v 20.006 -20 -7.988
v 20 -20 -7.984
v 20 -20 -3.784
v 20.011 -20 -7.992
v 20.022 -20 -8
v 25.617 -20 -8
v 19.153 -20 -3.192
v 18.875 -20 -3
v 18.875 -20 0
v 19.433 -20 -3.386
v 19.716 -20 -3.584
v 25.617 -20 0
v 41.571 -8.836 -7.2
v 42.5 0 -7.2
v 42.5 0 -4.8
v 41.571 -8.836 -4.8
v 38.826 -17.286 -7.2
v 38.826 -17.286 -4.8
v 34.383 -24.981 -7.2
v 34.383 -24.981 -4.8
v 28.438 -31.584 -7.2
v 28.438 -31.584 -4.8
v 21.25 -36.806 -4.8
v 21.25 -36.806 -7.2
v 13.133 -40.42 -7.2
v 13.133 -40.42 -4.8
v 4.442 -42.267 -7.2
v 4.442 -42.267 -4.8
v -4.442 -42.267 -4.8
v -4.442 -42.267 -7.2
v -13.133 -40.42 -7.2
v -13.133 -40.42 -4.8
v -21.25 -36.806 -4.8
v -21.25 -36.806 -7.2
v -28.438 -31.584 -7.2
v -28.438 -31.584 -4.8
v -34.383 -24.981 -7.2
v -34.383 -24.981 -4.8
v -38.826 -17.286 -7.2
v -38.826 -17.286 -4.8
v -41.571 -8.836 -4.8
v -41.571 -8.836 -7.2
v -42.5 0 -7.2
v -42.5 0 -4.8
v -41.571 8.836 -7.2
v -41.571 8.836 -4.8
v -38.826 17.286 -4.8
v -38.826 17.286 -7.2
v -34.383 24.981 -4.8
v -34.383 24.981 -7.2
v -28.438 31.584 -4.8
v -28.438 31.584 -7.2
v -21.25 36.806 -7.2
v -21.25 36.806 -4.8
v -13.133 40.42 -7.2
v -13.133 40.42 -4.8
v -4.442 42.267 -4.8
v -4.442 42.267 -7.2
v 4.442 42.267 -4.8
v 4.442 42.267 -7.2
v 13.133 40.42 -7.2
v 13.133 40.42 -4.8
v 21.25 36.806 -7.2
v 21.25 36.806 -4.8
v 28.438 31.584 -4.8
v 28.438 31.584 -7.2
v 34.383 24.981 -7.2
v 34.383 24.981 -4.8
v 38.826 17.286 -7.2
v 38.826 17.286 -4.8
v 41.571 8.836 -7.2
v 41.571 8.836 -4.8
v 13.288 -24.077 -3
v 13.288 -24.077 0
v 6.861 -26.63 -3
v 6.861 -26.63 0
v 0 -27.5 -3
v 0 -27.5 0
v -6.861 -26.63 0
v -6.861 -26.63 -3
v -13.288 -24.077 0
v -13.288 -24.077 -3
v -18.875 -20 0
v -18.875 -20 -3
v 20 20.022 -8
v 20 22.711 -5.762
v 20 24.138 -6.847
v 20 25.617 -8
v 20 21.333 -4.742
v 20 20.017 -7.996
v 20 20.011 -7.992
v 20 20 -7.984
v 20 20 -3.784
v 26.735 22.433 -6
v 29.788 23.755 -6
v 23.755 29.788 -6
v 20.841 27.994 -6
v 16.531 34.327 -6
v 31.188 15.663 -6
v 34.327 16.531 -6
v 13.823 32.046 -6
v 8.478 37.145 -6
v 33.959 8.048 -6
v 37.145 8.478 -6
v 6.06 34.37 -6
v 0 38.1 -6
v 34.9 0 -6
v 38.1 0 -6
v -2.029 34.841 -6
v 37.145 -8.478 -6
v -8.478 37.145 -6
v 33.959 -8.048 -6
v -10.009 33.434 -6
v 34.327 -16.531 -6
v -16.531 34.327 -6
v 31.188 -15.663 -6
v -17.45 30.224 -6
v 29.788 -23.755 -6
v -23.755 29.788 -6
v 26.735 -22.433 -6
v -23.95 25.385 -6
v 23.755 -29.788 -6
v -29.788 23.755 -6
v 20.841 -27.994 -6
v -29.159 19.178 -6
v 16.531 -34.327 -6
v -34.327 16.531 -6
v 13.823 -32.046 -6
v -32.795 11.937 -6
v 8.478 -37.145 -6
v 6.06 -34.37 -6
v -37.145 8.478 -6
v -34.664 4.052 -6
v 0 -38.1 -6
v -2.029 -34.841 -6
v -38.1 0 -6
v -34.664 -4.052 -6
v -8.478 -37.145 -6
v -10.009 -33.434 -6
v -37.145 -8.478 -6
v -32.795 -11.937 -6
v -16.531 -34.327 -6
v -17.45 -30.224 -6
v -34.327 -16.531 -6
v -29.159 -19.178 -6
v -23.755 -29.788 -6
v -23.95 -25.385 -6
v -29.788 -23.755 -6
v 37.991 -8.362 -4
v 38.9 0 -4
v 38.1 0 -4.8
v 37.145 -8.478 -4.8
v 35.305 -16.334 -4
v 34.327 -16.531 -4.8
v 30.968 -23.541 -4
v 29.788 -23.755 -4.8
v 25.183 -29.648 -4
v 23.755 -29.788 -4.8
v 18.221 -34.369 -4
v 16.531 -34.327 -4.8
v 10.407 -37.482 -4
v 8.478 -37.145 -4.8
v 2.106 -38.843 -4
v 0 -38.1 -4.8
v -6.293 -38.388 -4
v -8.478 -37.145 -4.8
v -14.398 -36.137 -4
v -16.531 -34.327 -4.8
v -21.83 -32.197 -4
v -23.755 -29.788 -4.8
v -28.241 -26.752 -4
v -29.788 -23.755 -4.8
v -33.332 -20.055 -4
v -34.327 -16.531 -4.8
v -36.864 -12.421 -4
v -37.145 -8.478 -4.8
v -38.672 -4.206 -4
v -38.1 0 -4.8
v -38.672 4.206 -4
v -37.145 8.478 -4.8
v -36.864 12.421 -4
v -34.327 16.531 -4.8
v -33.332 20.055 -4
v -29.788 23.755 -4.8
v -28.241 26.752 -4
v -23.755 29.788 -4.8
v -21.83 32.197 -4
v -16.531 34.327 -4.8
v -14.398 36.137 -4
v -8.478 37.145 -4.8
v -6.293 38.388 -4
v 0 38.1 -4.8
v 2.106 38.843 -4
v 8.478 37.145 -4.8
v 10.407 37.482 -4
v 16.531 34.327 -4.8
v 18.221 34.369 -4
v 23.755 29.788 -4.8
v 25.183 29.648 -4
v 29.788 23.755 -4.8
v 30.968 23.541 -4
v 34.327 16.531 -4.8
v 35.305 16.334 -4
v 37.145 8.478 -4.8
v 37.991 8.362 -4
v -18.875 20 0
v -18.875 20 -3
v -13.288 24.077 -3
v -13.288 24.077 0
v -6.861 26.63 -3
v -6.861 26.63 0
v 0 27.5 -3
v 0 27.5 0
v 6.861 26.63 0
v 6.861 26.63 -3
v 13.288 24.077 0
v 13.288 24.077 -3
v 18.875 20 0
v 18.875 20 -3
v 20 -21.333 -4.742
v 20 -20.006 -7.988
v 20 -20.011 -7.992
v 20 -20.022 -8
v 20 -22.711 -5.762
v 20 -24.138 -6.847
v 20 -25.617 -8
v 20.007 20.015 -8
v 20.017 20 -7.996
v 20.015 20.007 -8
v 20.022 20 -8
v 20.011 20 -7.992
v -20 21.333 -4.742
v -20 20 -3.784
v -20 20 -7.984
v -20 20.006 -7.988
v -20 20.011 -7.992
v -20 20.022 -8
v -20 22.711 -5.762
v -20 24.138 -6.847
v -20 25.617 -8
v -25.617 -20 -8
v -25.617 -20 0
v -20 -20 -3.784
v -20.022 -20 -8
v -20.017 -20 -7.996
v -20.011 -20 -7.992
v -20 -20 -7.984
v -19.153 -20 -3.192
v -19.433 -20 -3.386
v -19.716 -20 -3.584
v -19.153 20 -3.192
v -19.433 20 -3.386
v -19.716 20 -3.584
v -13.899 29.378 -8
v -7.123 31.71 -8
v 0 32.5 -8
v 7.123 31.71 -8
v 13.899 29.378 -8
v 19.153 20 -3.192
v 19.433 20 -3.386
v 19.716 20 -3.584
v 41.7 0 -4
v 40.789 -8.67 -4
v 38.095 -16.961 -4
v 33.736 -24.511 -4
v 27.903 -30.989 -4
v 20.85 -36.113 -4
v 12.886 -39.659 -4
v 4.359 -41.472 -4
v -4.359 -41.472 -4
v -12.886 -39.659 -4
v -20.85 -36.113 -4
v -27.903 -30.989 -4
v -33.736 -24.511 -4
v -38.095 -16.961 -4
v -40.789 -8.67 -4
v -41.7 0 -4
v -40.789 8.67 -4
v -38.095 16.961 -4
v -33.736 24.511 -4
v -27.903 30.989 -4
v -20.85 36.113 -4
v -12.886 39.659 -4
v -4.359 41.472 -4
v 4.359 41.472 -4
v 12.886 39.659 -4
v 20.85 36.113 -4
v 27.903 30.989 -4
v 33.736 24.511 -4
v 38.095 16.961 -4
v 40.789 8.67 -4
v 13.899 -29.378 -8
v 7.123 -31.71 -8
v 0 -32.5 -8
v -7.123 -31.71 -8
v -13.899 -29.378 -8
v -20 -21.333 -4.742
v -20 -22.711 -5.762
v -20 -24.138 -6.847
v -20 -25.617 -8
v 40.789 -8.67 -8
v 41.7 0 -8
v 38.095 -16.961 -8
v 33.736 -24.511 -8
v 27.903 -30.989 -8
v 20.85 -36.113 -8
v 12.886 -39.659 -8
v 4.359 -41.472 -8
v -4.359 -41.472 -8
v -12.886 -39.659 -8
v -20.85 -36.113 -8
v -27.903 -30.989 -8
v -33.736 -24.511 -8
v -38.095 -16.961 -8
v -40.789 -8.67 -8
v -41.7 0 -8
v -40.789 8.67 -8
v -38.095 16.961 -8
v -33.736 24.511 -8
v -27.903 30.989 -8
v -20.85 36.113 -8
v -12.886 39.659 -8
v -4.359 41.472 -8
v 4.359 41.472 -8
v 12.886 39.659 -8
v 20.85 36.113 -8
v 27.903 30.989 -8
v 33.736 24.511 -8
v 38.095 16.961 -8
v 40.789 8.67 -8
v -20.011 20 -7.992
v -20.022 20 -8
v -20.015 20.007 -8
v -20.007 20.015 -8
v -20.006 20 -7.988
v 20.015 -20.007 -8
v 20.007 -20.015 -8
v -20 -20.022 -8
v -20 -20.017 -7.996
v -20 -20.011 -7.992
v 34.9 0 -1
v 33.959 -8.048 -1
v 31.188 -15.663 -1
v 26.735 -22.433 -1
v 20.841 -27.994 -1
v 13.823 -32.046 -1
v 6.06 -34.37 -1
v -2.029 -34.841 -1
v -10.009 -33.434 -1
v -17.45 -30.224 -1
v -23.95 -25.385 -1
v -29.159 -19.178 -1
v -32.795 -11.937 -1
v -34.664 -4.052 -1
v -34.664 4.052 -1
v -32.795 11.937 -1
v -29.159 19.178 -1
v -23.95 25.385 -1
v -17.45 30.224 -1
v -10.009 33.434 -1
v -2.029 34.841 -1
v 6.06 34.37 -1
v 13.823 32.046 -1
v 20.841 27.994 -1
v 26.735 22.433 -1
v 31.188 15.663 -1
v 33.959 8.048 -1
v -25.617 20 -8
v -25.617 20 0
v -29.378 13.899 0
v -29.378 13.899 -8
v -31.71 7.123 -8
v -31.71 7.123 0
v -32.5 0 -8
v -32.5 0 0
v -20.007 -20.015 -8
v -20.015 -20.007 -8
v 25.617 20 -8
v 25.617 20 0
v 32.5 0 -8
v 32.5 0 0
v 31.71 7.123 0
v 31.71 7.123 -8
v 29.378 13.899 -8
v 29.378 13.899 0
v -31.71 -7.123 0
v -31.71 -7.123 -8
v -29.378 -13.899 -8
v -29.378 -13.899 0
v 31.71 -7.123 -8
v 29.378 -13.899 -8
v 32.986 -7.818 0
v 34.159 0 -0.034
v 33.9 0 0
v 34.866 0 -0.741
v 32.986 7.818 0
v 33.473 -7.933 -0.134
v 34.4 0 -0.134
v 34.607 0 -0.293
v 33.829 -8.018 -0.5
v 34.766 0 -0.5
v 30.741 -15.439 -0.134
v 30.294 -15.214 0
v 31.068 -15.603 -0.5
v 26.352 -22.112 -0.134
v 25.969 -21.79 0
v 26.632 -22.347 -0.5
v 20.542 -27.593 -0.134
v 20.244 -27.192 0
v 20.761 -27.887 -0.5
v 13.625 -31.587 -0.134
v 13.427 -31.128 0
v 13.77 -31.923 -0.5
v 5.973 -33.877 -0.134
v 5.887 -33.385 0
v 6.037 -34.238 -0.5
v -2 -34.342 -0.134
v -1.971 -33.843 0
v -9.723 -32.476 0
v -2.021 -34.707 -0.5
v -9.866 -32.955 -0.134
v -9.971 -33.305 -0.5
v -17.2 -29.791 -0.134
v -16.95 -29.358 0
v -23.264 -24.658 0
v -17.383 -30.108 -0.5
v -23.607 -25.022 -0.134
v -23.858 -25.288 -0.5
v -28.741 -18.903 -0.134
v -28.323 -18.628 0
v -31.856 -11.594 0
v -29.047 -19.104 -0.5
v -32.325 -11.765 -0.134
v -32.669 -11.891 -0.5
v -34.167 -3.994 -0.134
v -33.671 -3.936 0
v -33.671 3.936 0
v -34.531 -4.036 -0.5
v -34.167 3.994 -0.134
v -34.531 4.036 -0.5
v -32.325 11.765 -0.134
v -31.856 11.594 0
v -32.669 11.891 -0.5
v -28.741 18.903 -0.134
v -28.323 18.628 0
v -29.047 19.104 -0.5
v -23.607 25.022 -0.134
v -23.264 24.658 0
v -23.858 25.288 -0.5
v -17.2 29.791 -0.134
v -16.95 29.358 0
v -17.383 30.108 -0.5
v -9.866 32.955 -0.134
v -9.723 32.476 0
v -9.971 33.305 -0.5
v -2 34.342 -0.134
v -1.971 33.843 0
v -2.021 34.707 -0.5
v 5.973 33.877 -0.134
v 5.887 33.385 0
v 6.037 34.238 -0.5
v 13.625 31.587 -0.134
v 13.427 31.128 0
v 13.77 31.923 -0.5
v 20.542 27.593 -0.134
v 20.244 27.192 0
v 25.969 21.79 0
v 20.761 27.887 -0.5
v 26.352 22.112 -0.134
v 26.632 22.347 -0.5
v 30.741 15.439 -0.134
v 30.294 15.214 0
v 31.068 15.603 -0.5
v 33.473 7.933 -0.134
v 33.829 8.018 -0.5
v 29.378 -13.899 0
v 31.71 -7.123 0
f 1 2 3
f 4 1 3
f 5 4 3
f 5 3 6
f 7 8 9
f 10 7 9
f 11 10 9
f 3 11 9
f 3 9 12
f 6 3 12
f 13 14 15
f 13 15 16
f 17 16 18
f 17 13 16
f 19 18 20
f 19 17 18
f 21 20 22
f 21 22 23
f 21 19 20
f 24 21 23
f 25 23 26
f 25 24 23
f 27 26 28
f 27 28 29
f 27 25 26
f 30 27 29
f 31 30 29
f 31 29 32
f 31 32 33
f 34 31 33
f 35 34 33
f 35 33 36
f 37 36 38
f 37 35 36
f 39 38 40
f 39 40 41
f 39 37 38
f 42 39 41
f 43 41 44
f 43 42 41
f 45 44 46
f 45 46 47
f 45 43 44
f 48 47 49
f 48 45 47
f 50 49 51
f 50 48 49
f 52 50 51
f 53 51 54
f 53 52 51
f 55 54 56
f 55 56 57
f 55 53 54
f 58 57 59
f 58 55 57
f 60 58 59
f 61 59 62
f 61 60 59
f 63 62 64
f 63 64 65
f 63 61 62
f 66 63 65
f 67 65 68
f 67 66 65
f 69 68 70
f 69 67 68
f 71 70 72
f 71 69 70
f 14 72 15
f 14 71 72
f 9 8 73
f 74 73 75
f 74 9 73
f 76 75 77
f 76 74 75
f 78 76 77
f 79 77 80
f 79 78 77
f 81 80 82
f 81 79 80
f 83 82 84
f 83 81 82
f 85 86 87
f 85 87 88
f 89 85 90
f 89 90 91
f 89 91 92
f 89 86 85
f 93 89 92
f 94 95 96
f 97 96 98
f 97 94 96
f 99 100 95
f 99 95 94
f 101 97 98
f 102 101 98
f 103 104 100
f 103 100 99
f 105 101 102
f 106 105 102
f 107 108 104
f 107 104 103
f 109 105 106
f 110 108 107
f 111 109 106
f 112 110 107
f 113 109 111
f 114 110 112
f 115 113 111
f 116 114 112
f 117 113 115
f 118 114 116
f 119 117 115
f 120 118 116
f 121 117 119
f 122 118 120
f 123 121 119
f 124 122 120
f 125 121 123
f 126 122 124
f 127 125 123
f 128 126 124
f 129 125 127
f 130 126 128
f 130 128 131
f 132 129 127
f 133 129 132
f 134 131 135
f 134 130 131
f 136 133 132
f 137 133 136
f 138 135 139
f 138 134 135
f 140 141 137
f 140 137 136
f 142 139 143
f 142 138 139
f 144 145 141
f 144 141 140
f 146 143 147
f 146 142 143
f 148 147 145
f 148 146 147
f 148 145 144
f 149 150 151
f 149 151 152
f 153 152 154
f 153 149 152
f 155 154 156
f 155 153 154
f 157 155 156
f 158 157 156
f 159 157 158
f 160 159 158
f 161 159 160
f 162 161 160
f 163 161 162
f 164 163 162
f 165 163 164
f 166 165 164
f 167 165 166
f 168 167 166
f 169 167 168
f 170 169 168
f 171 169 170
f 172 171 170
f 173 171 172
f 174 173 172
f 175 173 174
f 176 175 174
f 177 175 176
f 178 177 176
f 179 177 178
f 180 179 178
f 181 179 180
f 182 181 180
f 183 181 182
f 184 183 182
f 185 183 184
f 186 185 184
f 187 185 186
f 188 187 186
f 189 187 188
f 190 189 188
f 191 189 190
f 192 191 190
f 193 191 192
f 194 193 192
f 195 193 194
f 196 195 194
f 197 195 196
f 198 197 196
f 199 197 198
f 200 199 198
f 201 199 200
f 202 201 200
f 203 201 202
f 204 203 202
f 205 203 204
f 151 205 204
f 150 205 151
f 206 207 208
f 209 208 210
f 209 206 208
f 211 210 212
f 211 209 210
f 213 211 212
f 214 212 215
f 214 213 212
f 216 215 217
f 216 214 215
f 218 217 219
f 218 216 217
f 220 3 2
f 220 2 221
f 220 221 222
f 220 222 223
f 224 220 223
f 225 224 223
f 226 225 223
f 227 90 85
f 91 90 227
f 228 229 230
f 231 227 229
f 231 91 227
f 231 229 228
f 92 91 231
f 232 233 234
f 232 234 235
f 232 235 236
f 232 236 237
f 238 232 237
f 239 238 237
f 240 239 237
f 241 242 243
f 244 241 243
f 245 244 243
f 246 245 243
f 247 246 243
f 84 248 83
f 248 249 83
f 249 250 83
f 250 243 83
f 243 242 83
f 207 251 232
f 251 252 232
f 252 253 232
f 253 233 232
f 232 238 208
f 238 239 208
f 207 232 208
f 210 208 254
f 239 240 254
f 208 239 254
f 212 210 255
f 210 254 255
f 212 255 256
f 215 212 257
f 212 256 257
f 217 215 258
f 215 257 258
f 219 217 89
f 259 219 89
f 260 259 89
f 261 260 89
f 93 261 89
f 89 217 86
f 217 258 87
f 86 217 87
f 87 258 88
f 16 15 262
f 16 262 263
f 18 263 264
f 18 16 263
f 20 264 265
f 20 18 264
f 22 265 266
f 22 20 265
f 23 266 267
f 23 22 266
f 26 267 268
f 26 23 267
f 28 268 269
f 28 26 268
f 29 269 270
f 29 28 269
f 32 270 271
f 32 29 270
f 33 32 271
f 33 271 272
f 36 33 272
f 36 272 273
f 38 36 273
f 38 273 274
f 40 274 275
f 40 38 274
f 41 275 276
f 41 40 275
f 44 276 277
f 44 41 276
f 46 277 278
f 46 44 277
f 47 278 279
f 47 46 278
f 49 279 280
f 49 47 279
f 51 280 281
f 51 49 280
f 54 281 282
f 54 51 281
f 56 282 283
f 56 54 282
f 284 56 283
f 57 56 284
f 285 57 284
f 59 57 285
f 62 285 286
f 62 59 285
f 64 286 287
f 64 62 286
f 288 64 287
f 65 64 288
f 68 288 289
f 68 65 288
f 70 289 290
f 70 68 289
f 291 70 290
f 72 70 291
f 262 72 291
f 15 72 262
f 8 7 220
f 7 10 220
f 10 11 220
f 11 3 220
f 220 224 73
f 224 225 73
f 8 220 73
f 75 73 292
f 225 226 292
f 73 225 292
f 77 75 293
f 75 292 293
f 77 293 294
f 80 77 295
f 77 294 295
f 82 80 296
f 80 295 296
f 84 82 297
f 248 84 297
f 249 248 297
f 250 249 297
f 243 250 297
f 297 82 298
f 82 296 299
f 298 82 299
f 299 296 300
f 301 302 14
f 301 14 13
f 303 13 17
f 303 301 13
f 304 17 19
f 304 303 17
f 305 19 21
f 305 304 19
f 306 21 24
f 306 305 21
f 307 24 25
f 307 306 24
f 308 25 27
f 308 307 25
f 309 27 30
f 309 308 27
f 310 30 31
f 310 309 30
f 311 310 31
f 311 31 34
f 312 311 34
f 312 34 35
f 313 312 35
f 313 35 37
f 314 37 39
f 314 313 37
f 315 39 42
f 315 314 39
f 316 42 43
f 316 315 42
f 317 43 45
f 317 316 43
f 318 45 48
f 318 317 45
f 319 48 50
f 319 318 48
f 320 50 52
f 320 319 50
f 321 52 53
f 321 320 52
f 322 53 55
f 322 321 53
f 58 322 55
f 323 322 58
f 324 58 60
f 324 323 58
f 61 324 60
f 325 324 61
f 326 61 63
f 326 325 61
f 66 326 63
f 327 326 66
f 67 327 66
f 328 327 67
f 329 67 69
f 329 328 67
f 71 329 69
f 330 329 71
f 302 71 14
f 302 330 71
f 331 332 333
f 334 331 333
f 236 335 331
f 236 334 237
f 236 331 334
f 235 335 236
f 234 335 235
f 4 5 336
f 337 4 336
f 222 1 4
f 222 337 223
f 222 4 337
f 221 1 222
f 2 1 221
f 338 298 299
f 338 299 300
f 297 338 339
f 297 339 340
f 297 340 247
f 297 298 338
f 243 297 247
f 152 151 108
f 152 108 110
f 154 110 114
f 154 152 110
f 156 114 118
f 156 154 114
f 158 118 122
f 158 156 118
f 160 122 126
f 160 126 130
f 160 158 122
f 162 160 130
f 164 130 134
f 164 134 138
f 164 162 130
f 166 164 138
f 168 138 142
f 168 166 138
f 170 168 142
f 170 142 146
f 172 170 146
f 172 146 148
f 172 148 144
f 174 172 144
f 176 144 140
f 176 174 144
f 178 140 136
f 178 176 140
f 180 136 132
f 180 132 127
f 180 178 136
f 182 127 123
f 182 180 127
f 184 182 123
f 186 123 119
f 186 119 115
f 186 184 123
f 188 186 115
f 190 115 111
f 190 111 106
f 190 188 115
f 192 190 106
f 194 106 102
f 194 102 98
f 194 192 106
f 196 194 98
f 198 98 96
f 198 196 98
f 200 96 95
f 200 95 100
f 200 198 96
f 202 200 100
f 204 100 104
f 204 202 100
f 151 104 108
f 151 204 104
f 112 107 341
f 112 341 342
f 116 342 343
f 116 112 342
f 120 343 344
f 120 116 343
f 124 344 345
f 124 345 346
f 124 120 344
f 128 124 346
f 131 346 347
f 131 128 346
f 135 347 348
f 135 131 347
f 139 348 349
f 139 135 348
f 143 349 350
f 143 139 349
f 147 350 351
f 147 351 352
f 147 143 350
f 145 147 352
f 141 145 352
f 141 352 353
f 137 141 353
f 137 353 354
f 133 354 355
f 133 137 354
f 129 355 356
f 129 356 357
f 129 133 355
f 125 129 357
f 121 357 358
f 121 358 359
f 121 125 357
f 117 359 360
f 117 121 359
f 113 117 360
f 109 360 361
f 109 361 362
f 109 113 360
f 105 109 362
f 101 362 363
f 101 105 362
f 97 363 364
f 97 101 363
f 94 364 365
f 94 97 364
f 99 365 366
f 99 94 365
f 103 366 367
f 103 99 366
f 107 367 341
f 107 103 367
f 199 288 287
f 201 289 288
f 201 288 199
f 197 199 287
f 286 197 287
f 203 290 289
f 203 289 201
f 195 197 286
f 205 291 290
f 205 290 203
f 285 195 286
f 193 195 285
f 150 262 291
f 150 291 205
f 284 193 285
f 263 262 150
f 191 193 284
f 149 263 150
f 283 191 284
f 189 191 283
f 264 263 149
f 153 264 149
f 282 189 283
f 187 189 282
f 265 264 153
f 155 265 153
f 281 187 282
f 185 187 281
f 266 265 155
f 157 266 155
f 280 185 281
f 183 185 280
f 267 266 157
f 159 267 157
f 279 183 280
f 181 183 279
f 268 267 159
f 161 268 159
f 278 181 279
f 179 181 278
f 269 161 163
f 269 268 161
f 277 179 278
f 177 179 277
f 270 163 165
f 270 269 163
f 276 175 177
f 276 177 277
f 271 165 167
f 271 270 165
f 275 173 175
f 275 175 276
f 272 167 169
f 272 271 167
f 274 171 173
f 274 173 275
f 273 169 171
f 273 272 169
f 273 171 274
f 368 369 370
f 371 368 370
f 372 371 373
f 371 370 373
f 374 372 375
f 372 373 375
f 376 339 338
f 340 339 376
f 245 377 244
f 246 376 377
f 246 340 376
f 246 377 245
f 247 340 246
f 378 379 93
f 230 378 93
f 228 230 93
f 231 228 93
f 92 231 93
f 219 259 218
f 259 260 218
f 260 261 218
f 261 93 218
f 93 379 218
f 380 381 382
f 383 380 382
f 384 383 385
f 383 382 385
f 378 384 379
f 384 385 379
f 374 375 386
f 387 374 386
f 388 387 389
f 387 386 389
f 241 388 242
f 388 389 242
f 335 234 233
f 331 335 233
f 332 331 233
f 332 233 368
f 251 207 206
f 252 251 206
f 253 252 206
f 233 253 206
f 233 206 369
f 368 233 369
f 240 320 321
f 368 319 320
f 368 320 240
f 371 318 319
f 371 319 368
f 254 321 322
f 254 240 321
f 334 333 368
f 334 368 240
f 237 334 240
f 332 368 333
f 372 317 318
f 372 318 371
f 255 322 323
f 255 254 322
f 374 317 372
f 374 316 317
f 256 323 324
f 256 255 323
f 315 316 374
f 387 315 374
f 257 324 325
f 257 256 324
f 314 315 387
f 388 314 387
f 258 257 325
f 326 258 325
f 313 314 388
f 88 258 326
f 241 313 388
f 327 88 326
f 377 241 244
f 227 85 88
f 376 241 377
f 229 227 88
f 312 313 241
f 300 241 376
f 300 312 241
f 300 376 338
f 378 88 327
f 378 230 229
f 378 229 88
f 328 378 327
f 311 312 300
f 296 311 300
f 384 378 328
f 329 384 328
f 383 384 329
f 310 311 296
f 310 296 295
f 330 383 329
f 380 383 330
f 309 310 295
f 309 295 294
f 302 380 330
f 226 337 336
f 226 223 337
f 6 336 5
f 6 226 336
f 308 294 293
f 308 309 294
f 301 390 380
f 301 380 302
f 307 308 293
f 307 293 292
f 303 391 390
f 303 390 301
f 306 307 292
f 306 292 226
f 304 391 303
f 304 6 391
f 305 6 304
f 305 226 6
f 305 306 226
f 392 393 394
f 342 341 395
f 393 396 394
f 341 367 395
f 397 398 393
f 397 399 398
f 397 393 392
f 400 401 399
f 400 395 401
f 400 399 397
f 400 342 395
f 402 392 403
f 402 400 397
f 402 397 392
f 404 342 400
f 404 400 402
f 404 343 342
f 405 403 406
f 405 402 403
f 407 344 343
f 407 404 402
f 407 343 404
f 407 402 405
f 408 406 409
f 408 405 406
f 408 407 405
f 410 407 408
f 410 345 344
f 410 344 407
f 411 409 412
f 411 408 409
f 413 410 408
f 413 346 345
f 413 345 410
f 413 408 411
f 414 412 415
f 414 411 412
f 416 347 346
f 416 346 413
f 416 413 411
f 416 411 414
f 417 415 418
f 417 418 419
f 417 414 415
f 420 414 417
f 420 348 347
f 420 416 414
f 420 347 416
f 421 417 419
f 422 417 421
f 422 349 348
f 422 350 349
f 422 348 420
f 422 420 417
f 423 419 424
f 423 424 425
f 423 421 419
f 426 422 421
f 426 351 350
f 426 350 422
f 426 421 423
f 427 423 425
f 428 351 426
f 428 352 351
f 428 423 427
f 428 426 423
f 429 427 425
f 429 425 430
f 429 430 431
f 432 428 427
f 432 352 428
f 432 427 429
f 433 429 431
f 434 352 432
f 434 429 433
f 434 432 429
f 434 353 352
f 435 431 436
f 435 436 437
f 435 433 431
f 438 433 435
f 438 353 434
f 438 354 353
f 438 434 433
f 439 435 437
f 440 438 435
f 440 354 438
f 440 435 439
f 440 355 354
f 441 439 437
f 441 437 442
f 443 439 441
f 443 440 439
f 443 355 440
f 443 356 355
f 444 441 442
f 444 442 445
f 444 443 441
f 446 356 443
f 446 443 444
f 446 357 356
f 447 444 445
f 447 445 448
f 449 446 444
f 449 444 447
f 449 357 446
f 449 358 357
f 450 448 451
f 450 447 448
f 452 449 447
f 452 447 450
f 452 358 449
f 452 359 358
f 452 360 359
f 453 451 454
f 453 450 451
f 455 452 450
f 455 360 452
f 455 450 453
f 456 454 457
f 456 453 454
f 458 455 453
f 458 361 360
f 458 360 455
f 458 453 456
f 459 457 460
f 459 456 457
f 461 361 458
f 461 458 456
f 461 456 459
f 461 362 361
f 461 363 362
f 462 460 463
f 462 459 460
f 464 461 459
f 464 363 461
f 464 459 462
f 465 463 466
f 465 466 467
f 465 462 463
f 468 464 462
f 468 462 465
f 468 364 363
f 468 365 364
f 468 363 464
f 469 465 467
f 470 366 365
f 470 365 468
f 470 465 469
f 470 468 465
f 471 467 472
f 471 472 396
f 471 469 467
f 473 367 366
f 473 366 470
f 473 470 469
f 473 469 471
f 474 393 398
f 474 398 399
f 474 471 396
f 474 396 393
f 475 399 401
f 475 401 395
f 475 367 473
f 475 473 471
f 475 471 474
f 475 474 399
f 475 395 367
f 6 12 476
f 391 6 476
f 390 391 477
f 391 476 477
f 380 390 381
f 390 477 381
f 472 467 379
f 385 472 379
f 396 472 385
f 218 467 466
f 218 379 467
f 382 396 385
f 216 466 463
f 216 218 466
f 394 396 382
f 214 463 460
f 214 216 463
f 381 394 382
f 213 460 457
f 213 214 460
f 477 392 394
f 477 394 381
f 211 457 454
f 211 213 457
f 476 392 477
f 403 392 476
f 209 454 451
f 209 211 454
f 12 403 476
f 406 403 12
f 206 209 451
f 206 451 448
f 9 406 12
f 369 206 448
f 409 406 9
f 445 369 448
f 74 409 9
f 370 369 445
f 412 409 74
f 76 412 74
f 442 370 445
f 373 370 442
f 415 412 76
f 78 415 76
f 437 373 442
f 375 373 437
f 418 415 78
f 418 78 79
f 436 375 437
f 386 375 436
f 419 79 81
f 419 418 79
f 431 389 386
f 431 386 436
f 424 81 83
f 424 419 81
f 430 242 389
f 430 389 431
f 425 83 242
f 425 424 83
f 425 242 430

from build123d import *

# Parameters (mm, degrees)
FASE1_SIZE                      = 0.8
SCHNITT_LINEAR_AUSTRAGEN1_DEPTH = 10
SCHNITT_LINEAR_START            = -5
SCHNITT_LINEAR_AUSTRAGEN2_DEPTH = 5
FASE2_SIZE                      = 5
VERRUNDUNG1_R                   = 1


# Read off the part's stored shape, not the designer's step: Schnitt-Linear austragen2
with BuildPart() as part:
    # Skizze3 → Rotation1 (revolve)
    with BuildSketch(Plane(origin=(0, 0, 0), x_dir=(0, 0, -1), z_dir=(1, 0, 0)), mode=Mode.PRIVATE) as rotation1_sk:
        Polygon((0, 27.5), (0, 34.9), (6, 34.9), (6, 38.1), (4, 38.1), (4, 42.5), (8, 42.5), (8, 27.5), align=None)
    revolve(rotation1_sk.sketch.rotate(Axis((0, 0, 28.082191781), (0, 0, -1)), 90), axis=Axis((0, 0, 28.082191781), (0, 0, -1)))

    # Fase1
    fase1_edges = [part.edges().sort_by_distance(p)[0] for p in [
        (-27.5, 0, -8),
        (-42.5, 0, -8),
        (-42.5, 0, -4),
        (-38.1, 0, -4),
    ]]
    chamfer(fase1_edges, length=FASE1_SIZE)

    # Skizze4 → Schnitt-Linear austragen1 (cut)
    with BuildSketch(Plane.XY):
        with BuildLine():
            Line((25.617376915, 20), (-25.617376915, 20))
            ThreePointArc((-25.617376915, 20), (-30.731211738, 10.575567367), (-32.5, 0))
            Line((-32.5, 0), (32.5, 0))
            ThreePointArc((32.5, 0), (30.731211738, 10.575567367), (25.617376915, 20))
        make_face()
        with BuildLine():
            Line((32.5, 0), (-32.5, 0))
            ThreePointArc((-32.5, 0), (-30.731211738, -10.575567367), (-25.617376915, -20))
            Line((-25.617376915, -20), (25.617376915, -20))
            ThreePointArc((25.617376915, -20), (30.731211738, -10.575567367), (32.5, 0))
        make_face()
    extrude(amount=-SCHNITT_LINEAR_AUSTRAGEN1_DEPTH, mode=Mode.SUBTRACT)

    # Schnitt-Linear austragen2 outline → Schnitt-Linear austragen2 (cut)
    with BuildSketch(Plane(origin=(0, 0, -8), x_dir=(-1, 0, 0), z_dir=(0, 0, -1)).offset(SCHNITT_LINEAR_START)):
        with BuildLine():
            Line((-20, -20), (-20, -25.617376915))
            ThreePointArc((-20, -25.617376915), (0, -32.5), (20, -25.617376915))
            Line((20, -25.617376915), (20, -20))
            Line((20, -20), (18.874586088, -20))
            ThreePointArc((18.874586088, -20), (0, -27.5), (-18.874586088, -20))
            Line((-18.874586088, -20), (-20, -20))
        make_face()
        with BuildLine():
            Line((20, 20), (20, 25.617376915))
            ThreePointArc((20, 25.617376915), (0, 32.5), (-20, 25.617376915))
            Line((-20, 25.617376915), (-20, 20))
            Line((-20, 20), (-18.874586088, 20))
            ThreePointArc((-18.874586088, 20), (0, 27.5), (18.874586088, 20))
            Line((18.874586088, 20), (20, 20))
        make_face()
    extrude(amount=SCHNITT_LINEAR_AUSTRAGEN2_DEPTH, mode=Mode.SUBTRACT)

    # Fase2
    fase2_edges = [part.edges().sort_by_distance(p)[0] for p in [
        (0, -32.5, -3),
        (0, 32.5, -3),
    ]]
    chamfer(fase2_edges, length=FASE2_SIZE - 0.0001)  # a hair under: the kernel refuses the full size

    # Verrundung1
    verrundung1_edges = [part.edges().sort_by_distance(p)[0] for p in [
        (-34.9, 0, 0),
    ]]
    fillet(verrundung1_edges, radius=VERRUNDUNG1_R)


solid = part.part
